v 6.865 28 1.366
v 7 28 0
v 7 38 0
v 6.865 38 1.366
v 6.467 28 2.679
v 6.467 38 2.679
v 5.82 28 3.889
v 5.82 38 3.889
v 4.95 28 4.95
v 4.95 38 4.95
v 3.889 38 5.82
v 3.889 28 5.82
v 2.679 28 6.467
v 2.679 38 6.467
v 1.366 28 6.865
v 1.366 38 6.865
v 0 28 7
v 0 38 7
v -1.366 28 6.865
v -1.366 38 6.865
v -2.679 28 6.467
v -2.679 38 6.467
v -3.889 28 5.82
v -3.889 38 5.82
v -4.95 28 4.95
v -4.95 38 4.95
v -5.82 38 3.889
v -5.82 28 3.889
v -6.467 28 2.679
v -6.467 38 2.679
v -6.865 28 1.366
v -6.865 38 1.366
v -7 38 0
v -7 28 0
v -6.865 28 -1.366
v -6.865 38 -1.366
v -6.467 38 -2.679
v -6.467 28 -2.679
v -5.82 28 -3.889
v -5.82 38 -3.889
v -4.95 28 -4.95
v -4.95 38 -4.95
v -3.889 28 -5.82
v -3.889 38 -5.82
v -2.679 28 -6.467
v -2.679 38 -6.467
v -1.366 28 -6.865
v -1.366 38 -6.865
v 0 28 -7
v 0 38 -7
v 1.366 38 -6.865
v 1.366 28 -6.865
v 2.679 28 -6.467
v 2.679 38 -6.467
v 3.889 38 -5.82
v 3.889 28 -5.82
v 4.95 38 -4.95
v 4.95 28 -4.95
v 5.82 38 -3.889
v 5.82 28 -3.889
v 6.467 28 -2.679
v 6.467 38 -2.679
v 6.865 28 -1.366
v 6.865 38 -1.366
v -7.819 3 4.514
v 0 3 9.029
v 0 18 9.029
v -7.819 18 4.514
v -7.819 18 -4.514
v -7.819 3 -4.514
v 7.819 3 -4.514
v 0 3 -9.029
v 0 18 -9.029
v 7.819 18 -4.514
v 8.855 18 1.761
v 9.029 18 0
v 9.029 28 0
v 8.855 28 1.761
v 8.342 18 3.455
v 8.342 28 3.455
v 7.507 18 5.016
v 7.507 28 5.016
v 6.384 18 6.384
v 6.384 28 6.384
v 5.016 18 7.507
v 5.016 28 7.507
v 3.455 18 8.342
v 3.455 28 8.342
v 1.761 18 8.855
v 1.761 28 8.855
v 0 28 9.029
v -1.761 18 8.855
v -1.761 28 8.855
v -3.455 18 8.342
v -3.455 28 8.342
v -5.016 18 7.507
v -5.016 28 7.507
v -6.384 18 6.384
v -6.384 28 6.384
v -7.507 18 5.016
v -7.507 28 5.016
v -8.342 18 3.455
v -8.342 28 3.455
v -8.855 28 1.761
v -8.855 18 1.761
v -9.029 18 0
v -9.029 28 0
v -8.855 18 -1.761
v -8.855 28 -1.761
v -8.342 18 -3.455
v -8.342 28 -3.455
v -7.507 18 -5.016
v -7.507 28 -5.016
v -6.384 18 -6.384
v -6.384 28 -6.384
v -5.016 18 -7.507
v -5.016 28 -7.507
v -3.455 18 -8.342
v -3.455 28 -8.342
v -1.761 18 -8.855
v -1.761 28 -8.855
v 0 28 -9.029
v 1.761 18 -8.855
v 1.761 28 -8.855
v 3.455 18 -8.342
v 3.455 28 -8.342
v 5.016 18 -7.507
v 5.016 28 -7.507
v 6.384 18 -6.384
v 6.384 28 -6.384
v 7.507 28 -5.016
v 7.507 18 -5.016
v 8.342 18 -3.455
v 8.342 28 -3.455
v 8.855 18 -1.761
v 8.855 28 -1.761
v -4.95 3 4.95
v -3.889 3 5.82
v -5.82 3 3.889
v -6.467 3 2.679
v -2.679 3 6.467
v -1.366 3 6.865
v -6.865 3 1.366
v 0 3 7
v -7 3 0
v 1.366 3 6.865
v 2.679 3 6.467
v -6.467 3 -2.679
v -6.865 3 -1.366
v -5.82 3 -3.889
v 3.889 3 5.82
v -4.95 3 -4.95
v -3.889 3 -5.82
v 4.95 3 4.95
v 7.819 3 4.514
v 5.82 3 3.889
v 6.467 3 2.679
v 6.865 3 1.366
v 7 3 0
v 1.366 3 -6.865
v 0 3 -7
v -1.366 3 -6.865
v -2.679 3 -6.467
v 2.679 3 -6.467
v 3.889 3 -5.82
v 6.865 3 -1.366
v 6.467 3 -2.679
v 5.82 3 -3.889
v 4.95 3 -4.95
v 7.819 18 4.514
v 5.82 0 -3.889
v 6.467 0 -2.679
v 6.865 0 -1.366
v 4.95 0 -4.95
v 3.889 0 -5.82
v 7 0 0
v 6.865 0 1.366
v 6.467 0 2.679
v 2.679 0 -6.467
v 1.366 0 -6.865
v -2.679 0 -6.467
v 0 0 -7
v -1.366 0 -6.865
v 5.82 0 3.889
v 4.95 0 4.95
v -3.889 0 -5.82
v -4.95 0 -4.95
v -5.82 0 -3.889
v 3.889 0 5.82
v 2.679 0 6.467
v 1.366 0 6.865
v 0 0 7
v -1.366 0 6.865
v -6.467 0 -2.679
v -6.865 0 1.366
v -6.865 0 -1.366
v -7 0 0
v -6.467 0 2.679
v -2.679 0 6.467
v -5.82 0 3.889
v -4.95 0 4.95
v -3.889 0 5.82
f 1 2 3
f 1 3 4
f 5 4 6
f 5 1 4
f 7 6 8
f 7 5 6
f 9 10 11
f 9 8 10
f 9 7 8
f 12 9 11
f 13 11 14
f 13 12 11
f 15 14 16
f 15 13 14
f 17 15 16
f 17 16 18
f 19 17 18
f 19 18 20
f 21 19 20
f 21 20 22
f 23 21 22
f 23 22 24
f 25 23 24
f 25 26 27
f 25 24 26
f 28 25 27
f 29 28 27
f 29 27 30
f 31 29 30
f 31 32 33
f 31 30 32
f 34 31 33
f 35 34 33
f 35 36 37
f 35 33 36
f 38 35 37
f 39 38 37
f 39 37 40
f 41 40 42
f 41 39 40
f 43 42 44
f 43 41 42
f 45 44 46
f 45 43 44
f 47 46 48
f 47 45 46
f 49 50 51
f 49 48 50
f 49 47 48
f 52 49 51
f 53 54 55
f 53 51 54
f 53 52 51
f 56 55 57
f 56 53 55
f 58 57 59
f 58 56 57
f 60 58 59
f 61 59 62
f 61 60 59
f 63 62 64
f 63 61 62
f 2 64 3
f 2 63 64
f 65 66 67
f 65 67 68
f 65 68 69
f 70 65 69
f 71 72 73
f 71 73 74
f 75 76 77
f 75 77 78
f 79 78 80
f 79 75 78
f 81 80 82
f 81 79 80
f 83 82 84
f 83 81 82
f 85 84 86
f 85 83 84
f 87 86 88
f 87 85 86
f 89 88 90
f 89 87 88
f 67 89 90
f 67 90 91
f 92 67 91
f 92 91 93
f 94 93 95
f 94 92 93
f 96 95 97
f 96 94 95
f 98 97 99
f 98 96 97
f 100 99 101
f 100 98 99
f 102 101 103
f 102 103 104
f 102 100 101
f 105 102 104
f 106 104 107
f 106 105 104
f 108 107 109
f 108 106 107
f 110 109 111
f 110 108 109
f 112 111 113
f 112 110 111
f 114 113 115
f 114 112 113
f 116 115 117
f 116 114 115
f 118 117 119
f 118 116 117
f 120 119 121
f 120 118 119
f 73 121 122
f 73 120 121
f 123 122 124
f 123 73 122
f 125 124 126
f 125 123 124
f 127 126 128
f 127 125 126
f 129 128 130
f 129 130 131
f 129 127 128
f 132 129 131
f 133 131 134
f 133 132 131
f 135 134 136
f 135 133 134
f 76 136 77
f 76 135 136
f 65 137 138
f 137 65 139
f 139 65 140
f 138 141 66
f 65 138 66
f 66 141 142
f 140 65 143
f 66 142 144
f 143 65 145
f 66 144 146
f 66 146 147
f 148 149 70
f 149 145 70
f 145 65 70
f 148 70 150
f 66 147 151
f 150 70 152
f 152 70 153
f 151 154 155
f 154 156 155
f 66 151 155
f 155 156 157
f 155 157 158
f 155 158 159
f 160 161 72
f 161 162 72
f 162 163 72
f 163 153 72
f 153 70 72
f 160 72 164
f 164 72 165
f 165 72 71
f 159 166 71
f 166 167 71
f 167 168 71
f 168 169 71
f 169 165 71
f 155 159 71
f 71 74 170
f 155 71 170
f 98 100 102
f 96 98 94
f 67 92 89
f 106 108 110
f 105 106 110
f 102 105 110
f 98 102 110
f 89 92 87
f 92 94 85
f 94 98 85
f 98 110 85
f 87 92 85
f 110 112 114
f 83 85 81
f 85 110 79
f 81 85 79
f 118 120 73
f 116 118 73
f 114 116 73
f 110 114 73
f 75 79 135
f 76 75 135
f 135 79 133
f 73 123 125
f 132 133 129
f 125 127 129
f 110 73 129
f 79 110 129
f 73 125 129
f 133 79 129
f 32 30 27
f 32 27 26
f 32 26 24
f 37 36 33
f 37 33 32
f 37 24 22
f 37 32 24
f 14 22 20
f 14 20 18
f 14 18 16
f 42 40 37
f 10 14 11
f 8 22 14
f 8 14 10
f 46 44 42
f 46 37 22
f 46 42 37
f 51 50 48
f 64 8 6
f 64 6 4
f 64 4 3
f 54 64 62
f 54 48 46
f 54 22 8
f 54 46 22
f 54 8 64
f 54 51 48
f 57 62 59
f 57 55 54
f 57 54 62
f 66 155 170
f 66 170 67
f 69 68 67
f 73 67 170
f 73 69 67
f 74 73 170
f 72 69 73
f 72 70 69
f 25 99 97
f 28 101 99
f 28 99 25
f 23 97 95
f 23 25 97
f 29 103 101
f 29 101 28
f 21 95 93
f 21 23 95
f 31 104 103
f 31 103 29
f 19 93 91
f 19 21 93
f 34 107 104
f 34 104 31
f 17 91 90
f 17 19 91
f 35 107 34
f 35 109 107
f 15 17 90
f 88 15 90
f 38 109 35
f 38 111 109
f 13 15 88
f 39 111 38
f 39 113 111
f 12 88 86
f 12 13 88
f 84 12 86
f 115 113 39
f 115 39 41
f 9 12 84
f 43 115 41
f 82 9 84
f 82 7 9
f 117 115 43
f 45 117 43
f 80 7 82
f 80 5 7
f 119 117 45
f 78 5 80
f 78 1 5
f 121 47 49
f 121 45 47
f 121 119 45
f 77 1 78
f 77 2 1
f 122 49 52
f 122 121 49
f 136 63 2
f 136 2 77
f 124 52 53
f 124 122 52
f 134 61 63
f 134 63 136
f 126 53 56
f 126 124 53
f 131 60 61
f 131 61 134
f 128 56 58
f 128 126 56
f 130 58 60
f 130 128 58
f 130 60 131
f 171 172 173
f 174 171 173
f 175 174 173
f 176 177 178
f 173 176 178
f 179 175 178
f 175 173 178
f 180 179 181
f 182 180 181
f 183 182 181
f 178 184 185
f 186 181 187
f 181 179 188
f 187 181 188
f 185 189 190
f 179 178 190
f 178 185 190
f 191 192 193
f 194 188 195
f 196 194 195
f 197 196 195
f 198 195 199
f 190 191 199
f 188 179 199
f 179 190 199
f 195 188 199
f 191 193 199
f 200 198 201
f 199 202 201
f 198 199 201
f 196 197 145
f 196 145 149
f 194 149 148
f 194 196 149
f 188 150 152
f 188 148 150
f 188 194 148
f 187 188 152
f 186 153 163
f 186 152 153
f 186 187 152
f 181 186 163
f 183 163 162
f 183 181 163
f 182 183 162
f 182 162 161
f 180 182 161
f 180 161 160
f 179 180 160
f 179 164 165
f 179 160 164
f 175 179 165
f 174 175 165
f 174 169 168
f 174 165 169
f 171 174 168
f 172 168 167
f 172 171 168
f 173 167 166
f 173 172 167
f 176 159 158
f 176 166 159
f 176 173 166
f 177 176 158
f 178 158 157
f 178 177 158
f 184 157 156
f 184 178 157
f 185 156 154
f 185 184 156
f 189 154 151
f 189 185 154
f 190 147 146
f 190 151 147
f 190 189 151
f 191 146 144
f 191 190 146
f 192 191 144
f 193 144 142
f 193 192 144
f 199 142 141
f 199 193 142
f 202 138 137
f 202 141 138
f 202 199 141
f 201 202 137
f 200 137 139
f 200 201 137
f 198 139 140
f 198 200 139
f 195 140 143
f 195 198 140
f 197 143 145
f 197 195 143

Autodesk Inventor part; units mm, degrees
ref_plane "YZ Plane" through (0, 0, 0) normal (1, 0, 0) x (0, 1, 0)
ref_plane "XZ Plane" through (0, 0, 0) normal (0, 1, 0) x (-1, 0, 0)
ref_plane "XY Plane" through (0, 0, 0) normal (0, 0, 1) x (1, 0, 0)
sketch "Sketch1" plane through (0, 0, 0) normal (0, 1, 0) x (-1, 0, 0)
  circle A0 centre (0, 0) radius 7
  dimension "d0" = 14
extrude "Extrusion1" add sketch "Sketch1" along normal blind 3
sketch "Sketch2" plane through (0, 3, 0) normal (0, 1, 0) x (1, 0, 0)
  line L0 (-7.8193, 4.5145) -> (0, 9.0289)
  line L1 (0, 9.0289) -> (7.8193, 4.5145)
  line L2 (7.8193, 4.5145) -> (7.8193, -4.5145)
  line L3 (7.8193, -4.5145) -> (0, -9.0289)
  line L4 (0, -9.0289) -> (-7.8193, -4.5145)
  line L5 (-7.8193, -4.5145) -> (-7.8193, 4.5145)
  point P0 (0, 0)
  point P1 (0, 0)
extrude "Extrusion2" add sketch "Sketch2" along normal blind 15
thread "Thread1" size "M14x2" class "6g" standard "ANSI Metric M Profile" full length
sketch "Sketch3" plane through (0, 18, 0) normal (0, 1, 0) x (1, 0, 0)
  line L0 (0, 9.0289) -> (-7.8193, 4.5145) projected
  circle A0 centre (0, 0) radius 9.0289
extrude "Extrusion3" add sketch "Sketch3" along normal blind 10 separate body
sketch "Sketch4" plane through (0, 28, 0) normal (0, 1, 0) x (1, 0, 0)
  circle A0 centre (0, 0) radius 7
extrude "Extrusion4" add sketch "Sketch4" along normal blind 10 bodies 2
properties part number "valvula"
